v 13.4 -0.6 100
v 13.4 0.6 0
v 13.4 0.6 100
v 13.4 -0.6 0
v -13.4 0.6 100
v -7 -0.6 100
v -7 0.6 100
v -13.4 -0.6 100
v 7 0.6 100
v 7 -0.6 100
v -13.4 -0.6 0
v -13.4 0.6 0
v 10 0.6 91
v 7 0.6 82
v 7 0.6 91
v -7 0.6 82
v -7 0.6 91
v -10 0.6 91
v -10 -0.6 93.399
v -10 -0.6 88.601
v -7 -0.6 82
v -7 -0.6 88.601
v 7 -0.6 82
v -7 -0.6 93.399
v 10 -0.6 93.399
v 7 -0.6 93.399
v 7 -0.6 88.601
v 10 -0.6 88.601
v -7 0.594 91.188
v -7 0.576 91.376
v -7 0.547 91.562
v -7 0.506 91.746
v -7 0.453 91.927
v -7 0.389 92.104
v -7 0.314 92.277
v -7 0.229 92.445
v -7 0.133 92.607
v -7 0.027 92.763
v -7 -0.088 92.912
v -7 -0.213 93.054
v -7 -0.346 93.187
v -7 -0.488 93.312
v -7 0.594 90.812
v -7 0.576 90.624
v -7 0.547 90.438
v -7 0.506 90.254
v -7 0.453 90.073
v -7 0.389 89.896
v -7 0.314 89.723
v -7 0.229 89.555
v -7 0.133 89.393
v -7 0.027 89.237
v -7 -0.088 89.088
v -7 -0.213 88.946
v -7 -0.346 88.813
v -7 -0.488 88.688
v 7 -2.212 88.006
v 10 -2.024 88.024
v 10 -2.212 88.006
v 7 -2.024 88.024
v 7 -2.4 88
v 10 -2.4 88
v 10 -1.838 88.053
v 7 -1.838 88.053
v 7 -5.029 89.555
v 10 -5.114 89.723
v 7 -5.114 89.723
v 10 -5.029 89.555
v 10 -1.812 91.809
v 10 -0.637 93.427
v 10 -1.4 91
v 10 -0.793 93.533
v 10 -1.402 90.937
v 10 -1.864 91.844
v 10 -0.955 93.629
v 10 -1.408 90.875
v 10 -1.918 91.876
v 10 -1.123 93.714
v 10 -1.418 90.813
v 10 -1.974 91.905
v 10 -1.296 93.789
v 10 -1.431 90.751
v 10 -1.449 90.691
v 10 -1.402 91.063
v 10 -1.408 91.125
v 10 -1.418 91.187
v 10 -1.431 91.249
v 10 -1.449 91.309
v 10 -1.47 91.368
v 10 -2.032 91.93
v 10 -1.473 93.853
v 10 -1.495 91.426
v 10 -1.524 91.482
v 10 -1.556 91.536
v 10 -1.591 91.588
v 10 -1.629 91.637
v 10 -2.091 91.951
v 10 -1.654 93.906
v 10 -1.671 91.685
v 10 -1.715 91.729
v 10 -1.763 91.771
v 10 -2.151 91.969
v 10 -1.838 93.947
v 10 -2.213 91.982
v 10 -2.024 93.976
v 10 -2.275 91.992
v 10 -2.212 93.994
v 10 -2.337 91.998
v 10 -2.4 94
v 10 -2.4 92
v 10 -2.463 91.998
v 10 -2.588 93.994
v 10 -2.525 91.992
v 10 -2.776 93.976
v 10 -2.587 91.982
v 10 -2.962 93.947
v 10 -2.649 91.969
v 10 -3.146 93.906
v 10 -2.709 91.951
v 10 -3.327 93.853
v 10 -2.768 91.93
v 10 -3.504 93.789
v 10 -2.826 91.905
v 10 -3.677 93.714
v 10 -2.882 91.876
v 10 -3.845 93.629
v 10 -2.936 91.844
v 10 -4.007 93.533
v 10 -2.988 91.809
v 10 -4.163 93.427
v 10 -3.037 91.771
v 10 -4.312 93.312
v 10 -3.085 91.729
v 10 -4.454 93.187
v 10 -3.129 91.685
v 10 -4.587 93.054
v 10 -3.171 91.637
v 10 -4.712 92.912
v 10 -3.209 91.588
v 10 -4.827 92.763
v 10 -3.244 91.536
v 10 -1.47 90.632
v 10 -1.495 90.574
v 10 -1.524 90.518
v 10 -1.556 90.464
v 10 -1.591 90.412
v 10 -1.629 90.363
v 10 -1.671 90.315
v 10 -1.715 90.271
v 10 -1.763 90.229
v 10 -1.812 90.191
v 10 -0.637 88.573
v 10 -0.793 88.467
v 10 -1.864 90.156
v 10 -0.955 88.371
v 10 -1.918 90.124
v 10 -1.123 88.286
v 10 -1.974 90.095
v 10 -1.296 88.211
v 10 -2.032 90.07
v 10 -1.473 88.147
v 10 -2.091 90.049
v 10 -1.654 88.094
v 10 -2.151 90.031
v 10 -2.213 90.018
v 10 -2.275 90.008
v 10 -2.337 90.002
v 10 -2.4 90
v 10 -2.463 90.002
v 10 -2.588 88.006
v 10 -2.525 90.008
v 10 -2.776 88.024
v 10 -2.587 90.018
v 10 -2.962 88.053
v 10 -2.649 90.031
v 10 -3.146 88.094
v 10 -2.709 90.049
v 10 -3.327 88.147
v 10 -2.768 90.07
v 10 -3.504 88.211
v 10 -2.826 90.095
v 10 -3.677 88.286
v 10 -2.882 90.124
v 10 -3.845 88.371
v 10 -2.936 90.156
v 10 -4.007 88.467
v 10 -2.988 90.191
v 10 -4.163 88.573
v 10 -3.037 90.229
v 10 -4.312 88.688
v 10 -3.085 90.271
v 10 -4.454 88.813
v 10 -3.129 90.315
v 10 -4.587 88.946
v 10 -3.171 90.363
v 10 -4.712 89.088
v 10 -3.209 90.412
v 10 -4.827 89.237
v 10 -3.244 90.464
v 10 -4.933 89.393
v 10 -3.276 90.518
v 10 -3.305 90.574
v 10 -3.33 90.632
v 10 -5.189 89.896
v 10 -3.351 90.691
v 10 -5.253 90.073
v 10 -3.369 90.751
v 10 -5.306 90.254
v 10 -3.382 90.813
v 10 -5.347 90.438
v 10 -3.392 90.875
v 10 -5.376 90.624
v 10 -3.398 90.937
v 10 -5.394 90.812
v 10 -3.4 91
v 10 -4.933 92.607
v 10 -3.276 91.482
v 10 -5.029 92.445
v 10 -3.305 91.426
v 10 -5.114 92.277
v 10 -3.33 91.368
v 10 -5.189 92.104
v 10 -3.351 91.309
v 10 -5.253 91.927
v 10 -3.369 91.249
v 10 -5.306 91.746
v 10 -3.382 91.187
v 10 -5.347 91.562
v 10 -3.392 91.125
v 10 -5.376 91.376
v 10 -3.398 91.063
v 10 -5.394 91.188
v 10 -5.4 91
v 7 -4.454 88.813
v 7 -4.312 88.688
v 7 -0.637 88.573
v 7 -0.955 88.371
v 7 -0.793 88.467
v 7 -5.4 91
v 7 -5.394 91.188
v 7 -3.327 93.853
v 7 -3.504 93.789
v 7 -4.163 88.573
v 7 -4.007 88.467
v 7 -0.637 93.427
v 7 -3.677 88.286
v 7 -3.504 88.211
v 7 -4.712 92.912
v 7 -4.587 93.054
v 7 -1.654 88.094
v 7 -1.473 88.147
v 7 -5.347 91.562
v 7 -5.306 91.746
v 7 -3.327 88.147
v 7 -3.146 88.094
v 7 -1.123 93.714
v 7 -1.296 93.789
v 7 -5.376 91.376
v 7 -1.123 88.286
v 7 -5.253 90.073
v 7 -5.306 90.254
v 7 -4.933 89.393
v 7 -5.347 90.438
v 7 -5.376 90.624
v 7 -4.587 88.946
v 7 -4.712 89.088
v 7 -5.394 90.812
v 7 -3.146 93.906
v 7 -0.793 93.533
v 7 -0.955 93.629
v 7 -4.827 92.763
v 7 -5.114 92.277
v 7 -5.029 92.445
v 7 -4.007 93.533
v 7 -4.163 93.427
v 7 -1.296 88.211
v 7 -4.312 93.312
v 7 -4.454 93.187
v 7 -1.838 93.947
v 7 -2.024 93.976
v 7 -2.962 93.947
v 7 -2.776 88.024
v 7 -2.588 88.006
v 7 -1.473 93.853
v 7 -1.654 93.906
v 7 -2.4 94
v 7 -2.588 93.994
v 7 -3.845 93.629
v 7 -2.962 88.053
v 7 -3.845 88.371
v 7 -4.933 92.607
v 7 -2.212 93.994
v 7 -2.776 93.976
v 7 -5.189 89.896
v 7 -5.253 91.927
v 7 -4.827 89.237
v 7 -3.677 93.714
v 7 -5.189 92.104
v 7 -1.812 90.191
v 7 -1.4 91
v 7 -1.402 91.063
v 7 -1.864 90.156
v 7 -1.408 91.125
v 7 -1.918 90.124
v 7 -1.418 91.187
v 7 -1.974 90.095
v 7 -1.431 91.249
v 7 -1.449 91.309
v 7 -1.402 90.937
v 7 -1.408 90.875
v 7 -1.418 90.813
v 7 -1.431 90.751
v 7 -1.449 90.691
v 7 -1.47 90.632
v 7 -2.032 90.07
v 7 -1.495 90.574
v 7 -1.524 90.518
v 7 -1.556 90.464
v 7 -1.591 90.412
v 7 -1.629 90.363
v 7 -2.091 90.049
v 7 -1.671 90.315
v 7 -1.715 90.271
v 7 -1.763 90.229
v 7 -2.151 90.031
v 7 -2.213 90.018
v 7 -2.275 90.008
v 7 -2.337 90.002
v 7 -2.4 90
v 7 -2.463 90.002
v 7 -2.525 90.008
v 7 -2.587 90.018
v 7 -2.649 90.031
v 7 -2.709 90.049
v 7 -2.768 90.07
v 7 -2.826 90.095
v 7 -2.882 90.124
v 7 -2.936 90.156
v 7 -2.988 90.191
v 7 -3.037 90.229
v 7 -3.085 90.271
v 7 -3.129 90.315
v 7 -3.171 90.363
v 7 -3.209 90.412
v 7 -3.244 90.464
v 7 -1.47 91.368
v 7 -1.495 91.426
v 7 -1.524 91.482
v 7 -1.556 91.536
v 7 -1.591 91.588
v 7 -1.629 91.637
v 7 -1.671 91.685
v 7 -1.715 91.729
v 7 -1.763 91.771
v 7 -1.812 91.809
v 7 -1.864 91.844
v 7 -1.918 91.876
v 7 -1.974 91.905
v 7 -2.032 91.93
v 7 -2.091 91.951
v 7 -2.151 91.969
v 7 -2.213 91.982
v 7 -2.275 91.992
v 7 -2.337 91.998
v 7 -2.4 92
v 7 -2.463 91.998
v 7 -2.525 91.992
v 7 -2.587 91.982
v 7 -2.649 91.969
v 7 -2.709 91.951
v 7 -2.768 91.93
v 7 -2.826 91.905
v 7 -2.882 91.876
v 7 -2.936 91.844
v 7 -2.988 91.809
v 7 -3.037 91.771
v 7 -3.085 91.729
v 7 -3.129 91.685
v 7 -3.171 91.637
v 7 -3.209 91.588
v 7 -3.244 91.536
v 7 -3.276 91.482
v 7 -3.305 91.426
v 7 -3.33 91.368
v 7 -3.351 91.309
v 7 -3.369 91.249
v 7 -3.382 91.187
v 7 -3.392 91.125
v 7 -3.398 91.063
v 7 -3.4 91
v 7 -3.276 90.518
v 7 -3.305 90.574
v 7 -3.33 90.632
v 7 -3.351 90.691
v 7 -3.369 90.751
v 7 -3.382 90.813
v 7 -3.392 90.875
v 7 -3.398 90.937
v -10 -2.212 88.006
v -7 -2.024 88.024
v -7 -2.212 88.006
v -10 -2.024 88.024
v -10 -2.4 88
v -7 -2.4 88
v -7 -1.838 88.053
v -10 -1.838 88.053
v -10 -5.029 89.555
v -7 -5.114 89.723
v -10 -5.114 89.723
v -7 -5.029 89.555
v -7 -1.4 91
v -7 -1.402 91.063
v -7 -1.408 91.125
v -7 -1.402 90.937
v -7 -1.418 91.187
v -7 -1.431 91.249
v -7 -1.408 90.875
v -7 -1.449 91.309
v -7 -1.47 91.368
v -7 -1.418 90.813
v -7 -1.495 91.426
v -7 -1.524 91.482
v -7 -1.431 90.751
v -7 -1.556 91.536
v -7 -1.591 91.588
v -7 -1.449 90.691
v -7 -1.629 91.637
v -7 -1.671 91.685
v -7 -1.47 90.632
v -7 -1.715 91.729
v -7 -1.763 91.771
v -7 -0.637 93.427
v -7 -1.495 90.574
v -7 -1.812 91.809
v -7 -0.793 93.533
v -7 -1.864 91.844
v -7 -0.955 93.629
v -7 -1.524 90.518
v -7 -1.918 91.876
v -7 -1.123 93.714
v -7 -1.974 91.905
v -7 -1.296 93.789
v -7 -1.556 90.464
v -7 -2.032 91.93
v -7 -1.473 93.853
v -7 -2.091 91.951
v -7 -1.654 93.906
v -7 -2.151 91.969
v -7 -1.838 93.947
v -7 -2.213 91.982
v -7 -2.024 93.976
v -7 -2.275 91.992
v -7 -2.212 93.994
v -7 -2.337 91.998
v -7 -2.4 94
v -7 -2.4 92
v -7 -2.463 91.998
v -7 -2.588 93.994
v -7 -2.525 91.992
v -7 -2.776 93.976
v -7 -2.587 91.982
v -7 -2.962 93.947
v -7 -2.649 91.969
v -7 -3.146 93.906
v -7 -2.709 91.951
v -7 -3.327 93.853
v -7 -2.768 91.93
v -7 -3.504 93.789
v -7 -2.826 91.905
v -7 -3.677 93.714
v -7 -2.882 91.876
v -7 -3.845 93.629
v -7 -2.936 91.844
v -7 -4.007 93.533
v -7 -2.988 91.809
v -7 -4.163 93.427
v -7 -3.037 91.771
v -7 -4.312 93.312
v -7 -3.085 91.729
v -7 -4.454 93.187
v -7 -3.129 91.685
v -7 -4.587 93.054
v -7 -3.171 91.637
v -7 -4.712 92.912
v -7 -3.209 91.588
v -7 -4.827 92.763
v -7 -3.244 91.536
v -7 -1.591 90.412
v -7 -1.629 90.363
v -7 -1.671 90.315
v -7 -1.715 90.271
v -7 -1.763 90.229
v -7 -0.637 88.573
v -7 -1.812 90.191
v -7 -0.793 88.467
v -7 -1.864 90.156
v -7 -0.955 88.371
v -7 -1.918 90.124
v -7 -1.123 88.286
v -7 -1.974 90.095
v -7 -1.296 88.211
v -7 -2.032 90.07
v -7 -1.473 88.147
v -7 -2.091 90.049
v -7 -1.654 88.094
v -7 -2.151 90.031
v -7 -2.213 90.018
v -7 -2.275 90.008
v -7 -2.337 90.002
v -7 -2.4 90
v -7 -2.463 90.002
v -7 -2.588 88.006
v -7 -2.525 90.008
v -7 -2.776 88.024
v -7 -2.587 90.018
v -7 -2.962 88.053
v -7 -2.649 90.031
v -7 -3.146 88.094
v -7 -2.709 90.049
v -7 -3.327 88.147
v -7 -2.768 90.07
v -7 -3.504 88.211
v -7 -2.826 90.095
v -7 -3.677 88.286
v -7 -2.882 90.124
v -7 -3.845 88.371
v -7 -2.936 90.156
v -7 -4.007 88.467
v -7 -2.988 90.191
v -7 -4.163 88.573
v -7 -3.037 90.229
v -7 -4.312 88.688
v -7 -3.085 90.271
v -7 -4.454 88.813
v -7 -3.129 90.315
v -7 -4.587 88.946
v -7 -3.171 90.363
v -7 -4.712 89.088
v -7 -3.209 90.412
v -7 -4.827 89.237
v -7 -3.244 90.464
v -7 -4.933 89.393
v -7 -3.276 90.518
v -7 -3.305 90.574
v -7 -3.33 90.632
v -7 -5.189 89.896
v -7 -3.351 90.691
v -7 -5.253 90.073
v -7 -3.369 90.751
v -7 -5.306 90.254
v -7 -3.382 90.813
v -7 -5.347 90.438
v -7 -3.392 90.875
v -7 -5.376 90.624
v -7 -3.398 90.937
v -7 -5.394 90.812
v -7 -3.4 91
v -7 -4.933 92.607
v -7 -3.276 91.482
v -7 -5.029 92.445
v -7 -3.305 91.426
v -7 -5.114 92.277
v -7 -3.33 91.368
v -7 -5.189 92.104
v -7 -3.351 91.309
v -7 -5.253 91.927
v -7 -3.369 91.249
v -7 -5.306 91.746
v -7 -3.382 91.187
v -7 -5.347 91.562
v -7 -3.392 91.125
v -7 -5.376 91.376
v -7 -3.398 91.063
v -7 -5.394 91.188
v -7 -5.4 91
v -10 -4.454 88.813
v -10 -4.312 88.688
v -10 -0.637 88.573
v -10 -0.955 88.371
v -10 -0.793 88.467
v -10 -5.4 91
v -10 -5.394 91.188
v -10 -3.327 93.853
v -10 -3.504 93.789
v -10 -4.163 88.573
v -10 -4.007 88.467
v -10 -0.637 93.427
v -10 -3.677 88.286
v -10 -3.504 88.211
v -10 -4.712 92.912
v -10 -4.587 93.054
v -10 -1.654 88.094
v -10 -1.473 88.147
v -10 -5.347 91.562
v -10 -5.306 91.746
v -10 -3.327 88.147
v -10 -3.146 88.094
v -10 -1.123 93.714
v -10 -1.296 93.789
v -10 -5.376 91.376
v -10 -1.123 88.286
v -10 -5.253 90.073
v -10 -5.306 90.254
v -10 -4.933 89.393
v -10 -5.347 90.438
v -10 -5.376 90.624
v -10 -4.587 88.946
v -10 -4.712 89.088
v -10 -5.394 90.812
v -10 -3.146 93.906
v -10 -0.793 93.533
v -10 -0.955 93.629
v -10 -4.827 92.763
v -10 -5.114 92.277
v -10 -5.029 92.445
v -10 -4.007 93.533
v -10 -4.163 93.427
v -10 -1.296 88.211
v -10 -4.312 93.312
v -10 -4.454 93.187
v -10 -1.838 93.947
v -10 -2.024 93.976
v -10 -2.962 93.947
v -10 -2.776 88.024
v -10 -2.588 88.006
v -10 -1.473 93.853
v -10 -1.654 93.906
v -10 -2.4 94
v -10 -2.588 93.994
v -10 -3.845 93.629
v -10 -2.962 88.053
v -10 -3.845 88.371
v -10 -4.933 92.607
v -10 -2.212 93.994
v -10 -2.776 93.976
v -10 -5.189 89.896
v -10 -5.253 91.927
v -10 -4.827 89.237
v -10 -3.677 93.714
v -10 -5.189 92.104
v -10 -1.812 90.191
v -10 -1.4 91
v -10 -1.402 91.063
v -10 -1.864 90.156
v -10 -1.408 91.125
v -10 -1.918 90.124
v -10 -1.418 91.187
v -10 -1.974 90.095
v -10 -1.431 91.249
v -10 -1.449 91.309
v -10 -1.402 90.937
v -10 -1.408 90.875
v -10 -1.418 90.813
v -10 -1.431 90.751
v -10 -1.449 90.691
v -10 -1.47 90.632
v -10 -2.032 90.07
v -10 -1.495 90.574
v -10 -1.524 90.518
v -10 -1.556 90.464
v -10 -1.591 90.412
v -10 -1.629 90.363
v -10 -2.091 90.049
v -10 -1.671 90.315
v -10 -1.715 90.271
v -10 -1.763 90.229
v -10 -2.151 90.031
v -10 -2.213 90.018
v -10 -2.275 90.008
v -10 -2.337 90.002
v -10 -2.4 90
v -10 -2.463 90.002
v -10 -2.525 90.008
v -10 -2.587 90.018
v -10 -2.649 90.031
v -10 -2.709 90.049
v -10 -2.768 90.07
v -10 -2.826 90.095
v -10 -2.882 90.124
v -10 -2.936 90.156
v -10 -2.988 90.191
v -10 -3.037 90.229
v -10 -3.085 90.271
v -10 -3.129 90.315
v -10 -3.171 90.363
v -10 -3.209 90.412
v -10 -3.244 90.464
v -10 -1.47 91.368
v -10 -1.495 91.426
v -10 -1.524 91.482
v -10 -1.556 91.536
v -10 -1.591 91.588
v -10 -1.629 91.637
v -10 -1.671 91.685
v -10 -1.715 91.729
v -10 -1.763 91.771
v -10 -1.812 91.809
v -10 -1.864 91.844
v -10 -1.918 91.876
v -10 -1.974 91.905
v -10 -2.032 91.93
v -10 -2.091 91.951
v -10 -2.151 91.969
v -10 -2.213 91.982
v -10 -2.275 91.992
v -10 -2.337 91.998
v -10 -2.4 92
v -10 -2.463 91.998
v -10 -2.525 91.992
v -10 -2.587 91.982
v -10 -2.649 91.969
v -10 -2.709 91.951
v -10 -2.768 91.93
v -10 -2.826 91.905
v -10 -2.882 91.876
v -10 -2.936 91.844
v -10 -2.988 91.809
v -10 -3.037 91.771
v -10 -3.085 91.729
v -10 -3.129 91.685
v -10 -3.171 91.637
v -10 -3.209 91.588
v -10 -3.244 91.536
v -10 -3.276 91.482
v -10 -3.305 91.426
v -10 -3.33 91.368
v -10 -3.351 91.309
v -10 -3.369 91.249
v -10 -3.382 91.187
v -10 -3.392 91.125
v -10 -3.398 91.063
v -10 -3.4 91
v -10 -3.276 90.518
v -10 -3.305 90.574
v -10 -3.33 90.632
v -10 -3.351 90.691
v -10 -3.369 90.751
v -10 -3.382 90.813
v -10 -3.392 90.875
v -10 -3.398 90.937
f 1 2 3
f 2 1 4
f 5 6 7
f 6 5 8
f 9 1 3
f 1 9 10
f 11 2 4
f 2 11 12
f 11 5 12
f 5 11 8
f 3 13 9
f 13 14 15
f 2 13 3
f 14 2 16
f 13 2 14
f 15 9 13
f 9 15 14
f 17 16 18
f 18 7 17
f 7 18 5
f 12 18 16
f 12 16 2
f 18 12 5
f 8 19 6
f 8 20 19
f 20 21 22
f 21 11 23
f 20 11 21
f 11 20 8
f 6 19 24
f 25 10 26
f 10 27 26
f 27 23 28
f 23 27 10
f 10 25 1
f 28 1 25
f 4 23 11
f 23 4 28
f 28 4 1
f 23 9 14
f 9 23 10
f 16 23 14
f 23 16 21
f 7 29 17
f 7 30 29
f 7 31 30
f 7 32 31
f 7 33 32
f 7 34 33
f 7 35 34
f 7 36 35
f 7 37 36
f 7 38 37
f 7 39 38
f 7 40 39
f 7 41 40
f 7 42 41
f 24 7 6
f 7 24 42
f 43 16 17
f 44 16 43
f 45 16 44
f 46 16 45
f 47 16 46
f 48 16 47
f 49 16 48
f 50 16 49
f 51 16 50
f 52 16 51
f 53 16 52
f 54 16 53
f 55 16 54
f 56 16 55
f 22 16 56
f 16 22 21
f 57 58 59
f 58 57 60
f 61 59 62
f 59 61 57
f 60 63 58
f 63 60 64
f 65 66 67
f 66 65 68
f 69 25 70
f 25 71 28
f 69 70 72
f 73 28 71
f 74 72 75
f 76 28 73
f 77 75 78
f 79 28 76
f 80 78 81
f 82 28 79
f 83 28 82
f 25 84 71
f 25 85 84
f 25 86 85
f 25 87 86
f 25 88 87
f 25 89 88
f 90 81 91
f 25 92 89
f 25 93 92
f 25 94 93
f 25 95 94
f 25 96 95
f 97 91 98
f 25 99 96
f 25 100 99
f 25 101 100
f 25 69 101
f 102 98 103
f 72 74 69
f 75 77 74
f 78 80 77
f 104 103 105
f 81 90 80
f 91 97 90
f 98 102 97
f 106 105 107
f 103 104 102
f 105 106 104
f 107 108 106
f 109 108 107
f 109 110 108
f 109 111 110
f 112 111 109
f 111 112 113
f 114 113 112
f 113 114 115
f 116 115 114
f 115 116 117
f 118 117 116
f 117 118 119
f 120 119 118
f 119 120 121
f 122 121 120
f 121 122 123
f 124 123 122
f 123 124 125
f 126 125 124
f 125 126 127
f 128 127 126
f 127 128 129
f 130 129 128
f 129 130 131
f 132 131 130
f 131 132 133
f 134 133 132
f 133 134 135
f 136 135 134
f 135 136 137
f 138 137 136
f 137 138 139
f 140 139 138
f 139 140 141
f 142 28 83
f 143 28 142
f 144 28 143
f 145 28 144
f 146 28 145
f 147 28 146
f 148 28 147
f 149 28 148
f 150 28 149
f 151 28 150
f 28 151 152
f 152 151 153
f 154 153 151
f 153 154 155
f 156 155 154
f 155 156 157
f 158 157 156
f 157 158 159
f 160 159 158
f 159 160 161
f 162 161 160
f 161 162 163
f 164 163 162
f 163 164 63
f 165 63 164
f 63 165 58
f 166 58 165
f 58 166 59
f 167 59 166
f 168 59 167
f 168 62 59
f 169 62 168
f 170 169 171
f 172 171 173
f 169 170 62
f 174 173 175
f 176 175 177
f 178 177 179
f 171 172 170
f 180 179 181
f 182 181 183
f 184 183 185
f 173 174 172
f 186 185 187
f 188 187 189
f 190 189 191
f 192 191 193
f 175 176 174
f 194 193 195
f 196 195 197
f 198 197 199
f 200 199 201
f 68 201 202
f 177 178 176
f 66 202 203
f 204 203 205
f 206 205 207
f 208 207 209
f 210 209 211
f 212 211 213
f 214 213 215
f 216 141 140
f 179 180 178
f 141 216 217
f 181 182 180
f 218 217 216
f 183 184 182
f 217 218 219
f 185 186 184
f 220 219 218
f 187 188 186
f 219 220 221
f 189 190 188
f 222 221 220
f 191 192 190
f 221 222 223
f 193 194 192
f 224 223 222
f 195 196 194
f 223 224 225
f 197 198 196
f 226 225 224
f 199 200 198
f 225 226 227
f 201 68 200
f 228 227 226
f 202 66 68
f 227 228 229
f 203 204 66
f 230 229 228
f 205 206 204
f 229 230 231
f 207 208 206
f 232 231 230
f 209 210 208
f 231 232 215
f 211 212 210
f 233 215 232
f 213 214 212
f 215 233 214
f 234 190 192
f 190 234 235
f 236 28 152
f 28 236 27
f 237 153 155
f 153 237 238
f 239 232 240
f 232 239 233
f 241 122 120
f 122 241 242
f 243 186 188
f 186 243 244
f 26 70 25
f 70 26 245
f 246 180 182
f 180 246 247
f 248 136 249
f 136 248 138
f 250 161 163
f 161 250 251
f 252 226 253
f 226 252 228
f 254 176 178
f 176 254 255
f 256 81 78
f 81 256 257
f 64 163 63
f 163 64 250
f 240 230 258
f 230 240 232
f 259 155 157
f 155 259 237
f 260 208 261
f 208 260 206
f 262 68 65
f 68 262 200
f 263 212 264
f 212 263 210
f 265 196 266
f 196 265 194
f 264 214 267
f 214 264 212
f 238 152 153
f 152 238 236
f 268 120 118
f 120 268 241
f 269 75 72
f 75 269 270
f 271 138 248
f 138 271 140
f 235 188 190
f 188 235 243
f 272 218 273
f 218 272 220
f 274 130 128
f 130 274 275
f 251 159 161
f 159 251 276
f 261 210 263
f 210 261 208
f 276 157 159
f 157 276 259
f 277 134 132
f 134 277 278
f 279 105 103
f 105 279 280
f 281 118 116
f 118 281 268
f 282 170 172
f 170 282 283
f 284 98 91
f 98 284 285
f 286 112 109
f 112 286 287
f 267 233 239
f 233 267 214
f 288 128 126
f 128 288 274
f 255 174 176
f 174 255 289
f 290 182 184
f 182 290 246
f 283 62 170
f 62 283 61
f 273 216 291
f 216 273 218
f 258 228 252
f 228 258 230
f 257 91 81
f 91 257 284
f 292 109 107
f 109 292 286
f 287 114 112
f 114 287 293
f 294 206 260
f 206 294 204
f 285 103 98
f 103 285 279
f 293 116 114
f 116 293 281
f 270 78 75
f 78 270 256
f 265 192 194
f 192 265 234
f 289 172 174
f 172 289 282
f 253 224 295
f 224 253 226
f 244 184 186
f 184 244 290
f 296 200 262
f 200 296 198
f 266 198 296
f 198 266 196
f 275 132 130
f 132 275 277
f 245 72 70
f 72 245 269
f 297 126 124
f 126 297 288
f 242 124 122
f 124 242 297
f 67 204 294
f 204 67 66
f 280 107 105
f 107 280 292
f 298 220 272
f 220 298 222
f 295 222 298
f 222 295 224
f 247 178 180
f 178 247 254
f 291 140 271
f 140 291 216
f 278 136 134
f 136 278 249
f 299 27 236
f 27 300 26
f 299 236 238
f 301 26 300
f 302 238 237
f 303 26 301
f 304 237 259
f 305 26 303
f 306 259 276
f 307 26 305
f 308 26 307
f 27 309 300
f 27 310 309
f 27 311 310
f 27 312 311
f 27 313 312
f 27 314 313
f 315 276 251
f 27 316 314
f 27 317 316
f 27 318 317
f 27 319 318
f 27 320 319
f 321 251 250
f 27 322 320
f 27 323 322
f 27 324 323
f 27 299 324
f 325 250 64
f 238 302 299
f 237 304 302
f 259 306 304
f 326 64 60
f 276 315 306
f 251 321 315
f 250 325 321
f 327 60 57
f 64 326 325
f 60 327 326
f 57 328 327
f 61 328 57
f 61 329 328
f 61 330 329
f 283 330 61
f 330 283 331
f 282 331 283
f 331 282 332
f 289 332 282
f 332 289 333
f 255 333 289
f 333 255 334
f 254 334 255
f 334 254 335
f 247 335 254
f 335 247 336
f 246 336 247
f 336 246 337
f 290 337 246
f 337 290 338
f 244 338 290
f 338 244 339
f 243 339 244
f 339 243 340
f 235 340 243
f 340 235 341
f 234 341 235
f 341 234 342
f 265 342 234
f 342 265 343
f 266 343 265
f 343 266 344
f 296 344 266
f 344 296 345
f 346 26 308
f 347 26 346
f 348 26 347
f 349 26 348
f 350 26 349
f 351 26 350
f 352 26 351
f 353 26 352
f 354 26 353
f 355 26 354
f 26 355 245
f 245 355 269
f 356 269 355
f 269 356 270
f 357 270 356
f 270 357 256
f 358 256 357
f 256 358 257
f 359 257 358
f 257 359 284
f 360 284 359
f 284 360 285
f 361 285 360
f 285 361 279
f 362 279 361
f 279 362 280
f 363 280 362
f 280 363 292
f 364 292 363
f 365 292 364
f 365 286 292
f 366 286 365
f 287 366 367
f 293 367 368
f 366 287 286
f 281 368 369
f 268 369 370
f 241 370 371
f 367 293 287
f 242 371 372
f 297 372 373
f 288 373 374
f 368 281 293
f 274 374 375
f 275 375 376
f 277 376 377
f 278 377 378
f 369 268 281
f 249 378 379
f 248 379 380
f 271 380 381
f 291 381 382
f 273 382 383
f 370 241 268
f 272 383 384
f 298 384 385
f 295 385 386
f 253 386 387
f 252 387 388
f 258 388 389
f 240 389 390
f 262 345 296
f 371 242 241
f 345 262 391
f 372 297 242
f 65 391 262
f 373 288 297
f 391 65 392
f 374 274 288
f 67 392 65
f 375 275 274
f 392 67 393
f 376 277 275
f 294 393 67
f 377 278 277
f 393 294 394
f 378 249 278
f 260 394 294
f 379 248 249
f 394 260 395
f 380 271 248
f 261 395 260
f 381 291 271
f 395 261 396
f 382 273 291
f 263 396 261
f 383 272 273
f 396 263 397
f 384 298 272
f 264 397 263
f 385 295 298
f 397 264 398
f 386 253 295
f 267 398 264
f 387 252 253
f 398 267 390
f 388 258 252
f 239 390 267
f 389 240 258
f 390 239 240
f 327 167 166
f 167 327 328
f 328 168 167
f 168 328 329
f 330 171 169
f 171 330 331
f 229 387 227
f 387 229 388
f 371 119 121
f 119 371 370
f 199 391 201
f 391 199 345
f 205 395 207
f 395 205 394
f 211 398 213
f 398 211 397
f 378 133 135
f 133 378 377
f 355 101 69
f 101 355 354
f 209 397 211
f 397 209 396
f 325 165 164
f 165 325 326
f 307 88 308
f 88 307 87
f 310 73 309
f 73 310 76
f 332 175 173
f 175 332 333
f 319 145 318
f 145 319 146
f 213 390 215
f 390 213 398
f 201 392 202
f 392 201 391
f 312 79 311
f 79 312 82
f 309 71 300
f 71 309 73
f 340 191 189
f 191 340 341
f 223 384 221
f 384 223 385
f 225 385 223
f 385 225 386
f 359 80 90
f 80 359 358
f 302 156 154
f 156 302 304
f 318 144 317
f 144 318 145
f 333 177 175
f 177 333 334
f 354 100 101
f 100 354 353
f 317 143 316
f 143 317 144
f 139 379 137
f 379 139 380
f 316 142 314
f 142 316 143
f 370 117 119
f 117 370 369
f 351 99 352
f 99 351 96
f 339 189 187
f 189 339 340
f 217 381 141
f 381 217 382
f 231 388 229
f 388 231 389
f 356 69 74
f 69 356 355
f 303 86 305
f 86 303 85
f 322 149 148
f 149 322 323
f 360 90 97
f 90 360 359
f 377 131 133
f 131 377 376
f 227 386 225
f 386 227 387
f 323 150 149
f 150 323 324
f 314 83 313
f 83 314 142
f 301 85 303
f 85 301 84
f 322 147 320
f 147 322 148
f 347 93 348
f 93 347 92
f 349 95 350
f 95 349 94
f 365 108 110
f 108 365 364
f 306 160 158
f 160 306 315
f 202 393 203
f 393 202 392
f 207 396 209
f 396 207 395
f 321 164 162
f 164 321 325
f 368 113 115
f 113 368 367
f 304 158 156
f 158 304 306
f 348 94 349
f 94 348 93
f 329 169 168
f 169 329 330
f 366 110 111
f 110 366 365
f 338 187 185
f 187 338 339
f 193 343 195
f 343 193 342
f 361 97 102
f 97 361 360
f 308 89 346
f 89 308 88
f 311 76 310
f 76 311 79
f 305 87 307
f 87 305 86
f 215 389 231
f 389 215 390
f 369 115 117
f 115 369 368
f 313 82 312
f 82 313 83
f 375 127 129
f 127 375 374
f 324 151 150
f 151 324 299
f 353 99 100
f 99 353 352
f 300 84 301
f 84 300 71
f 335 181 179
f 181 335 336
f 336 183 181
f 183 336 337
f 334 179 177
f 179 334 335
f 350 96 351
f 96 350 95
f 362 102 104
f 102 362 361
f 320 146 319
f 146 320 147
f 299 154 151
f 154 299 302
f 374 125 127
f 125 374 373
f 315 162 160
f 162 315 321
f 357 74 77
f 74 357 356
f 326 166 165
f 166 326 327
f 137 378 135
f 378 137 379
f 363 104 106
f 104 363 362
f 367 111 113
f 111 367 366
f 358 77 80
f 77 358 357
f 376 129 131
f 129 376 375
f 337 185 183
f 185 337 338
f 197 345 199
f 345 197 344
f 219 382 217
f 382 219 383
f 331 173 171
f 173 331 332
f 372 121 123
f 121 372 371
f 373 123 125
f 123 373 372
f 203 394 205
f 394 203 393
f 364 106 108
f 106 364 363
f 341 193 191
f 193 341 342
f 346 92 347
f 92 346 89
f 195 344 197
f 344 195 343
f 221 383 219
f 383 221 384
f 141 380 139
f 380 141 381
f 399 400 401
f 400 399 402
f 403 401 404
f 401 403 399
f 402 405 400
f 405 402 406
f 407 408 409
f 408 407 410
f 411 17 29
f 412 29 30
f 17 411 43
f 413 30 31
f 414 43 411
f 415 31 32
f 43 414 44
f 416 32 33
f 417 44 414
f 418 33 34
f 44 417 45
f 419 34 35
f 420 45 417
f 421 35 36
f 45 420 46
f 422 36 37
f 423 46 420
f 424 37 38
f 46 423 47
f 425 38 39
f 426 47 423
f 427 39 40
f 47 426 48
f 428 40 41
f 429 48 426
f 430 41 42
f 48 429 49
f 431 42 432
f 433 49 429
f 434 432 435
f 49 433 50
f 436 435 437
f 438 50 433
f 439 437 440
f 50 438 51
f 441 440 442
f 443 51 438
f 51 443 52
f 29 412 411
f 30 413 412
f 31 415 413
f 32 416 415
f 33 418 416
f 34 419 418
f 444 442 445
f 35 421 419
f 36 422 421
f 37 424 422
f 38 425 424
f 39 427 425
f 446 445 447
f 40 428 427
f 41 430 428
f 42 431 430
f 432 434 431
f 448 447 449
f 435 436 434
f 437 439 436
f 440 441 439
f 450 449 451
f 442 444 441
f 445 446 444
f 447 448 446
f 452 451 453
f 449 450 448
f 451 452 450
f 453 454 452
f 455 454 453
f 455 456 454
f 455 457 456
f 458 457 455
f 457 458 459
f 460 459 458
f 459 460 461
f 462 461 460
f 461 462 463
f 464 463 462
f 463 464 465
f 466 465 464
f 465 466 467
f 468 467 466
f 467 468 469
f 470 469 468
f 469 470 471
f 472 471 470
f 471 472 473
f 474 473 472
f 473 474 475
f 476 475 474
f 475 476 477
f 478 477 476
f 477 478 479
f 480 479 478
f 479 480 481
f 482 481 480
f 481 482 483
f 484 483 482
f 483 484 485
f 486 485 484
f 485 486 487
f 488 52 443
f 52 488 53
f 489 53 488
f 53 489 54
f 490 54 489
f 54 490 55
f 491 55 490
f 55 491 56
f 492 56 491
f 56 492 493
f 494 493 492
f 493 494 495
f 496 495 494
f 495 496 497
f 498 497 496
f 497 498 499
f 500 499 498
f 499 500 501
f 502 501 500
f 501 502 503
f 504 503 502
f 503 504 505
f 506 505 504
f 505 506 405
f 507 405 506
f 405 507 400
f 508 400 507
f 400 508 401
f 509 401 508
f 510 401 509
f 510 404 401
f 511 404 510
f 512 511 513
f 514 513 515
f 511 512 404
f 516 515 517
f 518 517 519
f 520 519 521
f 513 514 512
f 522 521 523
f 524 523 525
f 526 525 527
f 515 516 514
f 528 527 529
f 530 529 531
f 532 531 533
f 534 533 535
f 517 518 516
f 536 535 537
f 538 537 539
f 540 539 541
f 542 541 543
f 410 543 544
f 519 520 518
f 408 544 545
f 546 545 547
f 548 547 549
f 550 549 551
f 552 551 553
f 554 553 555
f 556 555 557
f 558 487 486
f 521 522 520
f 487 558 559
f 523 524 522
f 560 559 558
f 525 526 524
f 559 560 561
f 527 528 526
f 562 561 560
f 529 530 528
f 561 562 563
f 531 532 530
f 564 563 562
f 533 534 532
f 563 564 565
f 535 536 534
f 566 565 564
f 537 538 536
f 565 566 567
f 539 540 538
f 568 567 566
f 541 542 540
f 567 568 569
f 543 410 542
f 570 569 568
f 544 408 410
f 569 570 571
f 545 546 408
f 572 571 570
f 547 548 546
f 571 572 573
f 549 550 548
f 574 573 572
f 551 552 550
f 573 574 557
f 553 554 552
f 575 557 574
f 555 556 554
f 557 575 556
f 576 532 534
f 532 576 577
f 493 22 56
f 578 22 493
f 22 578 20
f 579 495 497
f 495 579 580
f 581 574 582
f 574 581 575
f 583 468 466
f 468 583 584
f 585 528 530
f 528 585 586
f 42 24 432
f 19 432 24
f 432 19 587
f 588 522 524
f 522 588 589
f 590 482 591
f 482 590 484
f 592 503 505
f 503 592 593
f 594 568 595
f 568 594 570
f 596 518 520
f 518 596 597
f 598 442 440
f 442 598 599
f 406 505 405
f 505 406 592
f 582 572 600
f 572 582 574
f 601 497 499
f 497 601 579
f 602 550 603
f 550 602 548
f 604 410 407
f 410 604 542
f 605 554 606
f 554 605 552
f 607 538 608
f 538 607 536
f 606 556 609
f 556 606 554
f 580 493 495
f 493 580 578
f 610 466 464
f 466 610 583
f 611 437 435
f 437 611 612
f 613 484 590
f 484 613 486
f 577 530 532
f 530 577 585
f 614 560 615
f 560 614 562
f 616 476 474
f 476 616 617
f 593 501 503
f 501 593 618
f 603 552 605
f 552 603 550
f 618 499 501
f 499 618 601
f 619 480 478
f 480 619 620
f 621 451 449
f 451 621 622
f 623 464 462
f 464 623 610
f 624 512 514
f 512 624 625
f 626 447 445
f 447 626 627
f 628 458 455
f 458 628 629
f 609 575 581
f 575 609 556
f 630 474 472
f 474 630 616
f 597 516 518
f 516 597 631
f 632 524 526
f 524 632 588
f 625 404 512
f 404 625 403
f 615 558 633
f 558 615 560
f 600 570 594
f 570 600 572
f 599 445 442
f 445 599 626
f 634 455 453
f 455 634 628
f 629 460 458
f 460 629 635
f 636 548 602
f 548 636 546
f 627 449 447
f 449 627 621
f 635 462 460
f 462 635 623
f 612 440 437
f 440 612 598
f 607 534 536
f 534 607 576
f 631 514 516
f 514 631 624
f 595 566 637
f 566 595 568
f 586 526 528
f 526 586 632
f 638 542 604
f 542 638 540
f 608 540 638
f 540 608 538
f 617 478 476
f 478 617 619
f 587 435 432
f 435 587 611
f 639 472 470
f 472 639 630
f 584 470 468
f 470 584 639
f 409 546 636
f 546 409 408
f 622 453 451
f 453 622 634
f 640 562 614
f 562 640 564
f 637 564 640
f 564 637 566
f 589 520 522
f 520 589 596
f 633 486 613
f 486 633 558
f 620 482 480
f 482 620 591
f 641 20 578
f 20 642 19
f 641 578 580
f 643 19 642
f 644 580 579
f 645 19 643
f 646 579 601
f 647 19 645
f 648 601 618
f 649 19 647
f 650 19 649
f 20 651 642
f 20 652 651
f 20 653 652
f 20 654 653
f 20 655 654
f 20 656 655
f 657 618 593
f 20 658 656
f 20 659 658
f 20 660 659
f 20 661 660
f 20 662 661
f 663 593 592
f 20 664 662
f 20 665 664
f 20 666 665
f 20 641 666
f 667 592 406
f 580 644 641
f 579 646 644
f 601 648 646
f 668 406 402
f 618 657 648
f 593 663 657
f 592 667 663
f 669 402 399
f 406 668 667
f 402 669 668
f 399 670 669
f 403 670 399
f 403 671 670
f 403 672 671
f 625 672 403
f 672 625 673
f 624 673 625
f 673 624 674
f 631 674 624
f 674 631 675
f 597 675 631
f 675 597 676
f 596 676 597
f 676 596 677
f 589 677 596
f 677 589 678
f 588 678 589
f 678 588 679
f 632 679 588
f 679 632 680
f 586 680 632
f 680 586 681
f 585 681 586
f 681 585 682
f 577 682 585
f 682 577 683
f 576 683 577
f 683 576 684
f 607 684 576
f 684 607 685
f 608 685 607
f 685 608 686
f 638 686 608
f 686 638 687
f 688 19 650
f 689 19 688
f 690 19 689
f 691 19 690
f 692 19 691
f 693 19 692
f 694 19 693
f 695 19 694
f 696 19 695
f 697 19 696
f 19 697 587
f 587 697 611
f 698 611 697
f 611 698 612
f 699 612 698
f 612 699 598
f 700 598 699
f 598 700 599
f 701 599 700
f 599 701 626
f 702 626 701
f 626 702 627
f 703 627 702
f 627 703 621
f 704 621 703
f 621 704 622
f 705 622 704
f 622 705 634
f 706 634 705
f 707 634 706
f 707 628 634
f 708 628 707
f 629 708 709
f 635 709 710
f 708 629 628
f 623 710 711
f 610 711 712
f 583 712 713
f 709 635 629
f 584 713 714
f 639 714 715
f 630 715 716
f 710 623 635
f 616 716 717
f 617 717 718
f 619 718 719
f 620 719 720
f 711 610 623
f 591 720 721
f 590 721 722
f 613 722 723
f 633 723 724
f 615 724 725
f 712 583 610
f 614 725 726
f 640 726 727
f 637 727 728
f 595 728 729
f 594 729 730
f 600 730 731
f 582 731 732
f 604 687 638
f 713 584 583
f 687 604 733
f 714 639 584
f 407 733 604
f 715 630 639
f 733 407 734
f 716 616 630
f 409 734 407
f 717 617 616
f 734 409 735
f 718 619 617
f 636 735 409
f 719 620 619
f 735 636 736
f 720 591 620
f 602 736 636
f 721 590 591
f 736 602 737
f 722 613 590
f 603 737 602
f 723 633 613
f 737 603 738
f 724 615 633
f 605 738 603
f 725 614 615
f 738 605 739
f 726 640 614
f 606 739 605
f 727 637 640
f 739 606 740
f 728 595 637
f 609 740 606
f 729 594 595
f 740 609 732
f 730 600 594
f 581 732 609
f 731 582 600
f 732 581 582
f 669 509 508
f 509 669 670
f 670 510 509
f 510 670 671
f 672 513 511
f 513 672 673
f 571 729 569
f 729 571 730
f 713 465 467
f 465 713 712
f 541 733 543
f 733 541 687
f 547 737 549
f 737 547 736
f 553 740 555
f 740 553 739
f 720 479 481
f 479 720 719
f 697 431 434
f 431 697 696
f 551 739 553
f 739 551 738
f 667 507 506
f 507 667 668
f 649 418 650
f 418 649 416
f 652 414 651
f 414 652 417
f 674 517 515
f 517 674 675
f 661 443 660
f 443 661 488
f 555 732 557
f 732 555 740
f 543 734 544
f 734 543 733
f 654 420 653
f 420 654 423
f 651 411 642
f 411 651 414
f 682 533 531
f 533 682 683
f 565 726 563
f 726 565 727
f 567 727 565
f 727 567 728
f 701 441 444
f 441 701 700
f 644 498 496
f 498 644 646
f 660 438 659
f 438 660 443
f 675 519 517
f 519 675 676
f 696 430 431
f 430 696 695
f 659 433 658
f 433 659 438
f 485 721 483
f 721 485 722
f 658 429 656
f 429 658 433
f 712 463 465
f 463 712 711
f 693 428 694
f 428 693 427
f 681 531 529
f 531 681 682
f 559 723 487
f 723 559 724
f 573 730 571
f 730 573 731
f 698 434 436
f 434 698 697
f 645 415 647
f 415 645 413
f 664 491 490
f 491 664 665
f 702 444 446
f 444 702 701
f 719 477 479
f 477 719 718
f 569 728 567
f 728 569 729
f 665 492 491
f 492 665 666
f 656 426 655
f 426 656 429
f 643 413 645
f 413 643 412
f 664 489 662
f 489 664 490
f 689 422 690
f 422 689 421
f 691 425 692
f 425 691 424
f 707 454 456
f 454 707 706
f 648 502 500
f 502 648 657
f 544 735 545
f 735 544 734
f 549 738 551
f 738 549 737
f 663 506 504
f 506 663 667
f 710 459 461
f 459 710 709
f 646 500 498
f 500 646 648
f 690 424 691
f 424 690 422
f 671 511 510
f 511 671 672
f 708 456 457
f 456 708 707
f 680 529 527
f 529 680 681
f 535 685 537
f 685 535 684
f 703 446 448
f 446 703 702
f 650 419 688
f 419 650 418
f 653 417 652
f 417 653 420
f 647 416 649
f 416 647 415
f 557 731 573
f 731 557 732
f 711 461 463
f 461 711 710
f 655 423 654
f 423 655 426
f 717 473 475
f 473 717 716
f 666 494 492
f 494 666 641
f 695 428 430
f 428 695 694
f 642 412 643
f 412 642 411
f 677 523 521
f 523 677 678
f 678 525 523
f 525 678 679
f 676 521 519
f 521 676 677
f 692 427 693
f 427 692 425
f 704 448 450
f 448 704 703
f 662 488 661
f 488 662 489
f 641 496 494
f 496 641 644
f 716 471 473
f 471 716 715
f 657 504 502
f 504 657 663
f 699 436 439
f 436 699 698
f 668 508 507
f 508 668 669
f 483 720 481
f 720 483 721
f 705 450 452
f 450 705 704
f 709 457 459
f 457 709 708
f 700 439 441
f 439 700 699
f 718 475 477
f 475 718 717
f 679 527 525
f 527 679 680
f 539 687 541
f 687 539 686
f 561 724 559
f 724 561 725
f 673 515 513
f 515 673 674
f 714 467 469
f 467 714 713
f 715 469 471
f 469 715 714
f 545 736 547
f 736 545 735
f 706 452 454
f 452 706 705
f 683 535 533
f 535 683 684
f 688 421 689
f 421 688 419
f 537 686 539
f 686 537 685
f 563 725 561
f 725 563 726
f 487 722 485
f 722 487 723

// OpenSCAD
// file: Camera.scad
camera();

module camera() {
    objLength = 8;
    objD = 12;
    camW=14;
    camL=14;
    camH=8;
    
    union() {
        translate([0, -objLength - camH/2, 0]) rotate([90,0,0]) cube([camL, camW, camH], center=true);
        rotate([90,0,0]) translate([0, 0, -objLength]) cylinder(h=2*objLength, d=objD);
        translate([0,-4,0]) rotate([90,0,0]) viewField();
    }
}

module viewField() {
    hAng1 = 60;
    hAng2 = 60;
    vAng1 = 82 - 45;
    vAng2 = 45;
    coneHeight = 100;

    w1 = tan(hAng1) * coneHeight;
    w2 = -tan(hAng2) * coneHeight;
    h1 = tan(vAng1) * coneHeight;
    h2 = -tan(vAng2) * coneHeight;
    
    translate([0,0,-coneHeight]) polyhedron(
      points=[[w1,h1,0],[w1,h2,0],[w2,h2,0],[w2,h1,0],[0,0,coneHeight]],
      faces=[[0,1,4],[1,2,4],[2,3,4],[3,0,4],[1,0,3],[2,1,3]]
    );
}
// main file
use <Camera.scad>
/// coments
//params

$fn=100;
tlrnc=0.1;
overlap=15;
internalDiameter=27 - 2*tlrnc;
perimeter = 0.4;
wallThicknes = 3* perimeter;
length=100;
camL=14;
camW=18;


CamAltimeterMount();

module CamAltimeterMount() {
    translate([-internalDiameter/2, -wallThicknes/2, 0 ]) {
        difference() {
            cube([internalDiameter, wallThicknes, length ]);
            translate([internalDiameter/2 - camL/2 ,-tlrnc,length -camW ]) {
                cube([camL, wallThicknes + 2 * tlrnc, camW ]);
            }
        }
        translate([internalDiameter/2 + camL/2,-3*wallThicknes/2,length -camW + camW/2 ]) holder();
        translate([internalDiameter/2 - camL/2 - 3,-3*wallThicknes/2,length -camW + camW/2 ]) holder();
    }
}

module holder() {
    rotate([0,90,0]) difference() {
        cylinder(r=3, h=3);
        cylinder(r=1, h=3 + tlrnc);
    }
}
    
